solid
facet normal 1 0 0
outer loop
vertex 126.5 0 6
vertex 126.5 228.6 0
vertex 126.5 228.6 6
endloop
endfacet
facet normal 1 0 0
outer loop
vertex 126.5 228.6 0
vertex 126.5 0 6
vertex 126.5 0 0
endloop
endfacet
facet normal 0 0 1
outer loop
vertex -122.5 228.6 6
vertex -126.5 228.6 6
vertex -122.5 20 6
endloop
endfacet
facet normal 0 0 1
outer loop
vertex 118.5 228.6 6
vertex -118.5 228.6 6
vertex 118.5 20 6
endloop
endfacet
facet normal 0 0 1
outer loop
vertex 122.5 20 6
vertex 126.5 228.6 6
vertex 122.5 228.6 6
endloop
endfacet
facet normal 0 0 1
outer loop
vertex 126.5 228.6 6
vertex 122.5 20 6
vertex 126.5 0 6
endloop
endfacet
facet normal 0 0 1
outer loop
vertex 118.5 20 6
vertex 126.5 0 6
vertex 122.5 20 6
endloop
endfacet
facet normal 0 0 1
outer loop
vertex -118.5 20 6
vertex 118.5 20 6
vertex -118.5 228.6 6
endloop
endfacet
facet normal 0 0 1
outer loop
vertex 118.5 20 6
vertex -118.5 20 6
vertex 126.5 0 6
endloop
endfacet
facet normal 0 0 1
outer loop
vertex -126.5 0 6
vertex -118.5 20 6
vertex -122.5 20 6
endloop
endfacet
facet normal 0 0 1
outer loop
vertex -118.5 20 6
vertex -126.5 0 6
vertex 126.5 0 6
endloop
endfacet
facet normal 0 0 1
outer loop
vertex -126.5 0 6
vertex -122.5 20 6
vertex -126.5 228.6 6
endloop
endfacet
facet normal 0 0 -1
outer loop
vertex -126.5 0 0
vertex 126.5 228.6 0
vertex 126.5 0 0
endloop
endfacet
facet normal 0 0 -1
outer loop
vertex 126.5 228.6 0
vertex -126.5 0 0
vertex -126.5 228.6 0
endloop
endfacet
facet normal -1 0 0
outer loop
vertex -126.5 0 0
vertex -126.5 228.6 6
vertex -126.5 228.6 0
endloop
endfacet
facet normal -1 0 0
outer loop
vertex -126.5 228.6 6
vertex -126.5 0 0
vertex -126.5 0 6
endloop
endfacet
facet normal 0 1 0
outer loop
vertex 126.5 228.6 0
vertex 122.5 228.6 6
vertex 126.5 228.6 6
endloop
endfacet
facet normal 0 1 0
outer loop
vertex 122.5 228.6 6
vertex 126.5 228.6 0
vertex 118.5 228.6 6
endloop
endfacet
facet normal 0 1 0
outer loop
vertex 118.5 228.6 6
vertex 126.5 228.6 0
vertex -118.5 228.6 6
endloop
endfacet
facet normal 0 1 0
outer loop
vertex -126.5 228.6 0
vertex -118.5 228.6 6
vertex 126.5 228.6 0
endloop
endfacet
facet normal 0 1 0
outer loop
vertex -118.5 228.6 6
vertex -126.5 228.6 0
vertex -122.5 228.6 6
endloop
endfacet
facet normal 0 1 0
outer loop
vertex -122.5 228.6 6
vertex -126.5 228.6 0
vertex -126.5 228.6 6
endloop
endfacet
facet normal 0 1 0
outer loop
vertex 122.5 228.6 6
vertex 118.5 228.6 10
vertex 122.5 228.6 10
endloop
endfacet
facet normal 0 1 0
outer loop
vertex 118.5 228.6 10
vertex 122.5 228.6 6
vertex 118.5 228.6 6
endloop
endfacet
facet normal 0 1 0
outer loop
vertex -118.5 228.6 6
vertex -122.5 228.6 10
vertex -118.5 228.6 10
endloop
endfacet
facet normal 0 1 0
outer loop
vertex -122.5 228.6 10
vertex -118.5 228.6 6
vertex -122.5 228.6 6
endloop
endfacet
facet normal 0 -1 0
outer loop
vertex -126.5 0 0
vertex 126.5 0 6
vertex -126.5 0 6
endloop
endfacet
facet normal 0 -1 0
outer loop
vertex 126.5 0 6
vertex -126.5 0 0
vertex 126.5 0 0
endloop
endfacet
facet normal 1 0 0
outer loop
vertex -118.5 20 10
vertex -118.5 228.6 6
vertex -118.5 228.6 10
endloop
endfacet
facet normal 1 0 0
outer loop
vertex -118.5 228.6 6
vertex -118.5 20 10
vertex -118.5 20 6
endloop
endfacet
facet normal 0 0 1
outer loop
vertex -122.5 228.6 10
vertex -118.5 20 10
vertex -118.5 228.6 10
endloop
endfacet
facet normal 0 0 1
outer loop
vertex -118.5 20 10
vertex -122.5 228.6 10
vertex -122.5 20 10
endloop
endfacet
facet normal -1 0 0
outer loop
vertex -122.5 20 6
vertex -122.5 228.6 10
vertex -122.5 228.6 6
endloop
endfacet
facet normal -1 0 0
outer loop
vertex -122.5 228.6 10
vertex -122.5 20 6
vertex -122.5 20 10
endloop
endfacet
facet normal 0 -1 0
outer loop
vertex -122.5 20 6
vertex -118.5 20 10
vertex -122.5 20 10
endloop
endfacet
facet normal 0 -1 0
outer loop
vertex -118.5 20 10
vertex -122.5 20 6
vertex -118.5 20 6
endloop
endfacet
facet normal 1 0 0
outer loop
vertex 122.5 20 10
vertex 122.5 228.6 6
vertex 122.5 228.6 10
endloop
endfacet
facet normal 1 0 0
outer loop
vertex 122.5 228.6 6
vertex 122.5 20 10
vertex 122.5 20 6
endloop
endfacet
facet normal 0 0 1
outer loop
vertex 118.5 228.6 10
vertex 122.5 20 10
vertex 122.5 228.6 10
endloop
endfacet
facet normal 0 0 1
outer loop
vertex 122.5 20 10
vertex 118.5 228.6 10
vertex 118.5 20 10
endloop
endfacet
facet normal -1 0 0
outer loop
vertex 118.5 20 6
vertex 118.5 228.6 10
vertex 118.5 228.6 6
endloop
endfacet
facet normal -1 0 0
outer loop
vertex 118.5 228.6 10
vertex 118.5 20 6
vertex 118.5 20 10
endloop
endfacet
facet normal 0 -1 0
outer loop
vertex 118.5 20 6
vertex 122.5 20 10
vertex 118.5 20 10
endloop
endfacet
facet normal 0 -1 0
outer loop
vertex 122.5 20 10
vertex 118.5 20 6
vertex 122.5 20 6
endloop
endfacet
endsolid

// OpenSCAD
// =============================================================================
// CONSOLE10 — Bottom Panel  v3.0  (parametric remodel of new_nasa_bottom.stl)
//
// Single-piece floor slab + two side ridges that seat into the cheek
// bottom-edge rabbets. Width = 10" mini-rack standard, prints as one part.
// =============================================================================

panel_width   = 253;     // X, = 10" mini-rack width
panel_depth   = 228.6;   // Y, = module depth (cheek bottom edge)
floor_thick   = 6;       // Z, floor slab thickness
ridge_width   = 4;       // X width of each side ridge
ridge_height  = 4;       // Z height of ridge above the floor
ridge_inset   = 4;       // X gap from panel side edge to ridge outer face
ridge_setback = 20;      // Y gap from front edge to start of ridge

ridge_len = panel_depth - ridge_setback;   // 208.6

echo(str("bottom  ", panel_width, " x ", panel_depth, " x ", floor_thick + ridge_height,
         " mm   ridge ", ridge_width, "x", ridge_height, " len ", ridge_len));

module bottom_panel() {
    // floor slab — centered on X, front edge at Y=0
    translate([-panel_width/2, 0, 0])
        cube([panel_width, panel_depth, floor_thick]);

    // left ridge
    translate([-panel_width/2 + ridge_inset, ridge_setback, floor_thick])
        cube([ridge_width, ridge_len, ridge_height]);

    // right ridge
    translate([panel_width/2 - ridge_inset - ridge_width, ridge_setback, floor_thick])
        cube([ridge_width, ridge_len, ridge_height]);
}

bottom_panel();
